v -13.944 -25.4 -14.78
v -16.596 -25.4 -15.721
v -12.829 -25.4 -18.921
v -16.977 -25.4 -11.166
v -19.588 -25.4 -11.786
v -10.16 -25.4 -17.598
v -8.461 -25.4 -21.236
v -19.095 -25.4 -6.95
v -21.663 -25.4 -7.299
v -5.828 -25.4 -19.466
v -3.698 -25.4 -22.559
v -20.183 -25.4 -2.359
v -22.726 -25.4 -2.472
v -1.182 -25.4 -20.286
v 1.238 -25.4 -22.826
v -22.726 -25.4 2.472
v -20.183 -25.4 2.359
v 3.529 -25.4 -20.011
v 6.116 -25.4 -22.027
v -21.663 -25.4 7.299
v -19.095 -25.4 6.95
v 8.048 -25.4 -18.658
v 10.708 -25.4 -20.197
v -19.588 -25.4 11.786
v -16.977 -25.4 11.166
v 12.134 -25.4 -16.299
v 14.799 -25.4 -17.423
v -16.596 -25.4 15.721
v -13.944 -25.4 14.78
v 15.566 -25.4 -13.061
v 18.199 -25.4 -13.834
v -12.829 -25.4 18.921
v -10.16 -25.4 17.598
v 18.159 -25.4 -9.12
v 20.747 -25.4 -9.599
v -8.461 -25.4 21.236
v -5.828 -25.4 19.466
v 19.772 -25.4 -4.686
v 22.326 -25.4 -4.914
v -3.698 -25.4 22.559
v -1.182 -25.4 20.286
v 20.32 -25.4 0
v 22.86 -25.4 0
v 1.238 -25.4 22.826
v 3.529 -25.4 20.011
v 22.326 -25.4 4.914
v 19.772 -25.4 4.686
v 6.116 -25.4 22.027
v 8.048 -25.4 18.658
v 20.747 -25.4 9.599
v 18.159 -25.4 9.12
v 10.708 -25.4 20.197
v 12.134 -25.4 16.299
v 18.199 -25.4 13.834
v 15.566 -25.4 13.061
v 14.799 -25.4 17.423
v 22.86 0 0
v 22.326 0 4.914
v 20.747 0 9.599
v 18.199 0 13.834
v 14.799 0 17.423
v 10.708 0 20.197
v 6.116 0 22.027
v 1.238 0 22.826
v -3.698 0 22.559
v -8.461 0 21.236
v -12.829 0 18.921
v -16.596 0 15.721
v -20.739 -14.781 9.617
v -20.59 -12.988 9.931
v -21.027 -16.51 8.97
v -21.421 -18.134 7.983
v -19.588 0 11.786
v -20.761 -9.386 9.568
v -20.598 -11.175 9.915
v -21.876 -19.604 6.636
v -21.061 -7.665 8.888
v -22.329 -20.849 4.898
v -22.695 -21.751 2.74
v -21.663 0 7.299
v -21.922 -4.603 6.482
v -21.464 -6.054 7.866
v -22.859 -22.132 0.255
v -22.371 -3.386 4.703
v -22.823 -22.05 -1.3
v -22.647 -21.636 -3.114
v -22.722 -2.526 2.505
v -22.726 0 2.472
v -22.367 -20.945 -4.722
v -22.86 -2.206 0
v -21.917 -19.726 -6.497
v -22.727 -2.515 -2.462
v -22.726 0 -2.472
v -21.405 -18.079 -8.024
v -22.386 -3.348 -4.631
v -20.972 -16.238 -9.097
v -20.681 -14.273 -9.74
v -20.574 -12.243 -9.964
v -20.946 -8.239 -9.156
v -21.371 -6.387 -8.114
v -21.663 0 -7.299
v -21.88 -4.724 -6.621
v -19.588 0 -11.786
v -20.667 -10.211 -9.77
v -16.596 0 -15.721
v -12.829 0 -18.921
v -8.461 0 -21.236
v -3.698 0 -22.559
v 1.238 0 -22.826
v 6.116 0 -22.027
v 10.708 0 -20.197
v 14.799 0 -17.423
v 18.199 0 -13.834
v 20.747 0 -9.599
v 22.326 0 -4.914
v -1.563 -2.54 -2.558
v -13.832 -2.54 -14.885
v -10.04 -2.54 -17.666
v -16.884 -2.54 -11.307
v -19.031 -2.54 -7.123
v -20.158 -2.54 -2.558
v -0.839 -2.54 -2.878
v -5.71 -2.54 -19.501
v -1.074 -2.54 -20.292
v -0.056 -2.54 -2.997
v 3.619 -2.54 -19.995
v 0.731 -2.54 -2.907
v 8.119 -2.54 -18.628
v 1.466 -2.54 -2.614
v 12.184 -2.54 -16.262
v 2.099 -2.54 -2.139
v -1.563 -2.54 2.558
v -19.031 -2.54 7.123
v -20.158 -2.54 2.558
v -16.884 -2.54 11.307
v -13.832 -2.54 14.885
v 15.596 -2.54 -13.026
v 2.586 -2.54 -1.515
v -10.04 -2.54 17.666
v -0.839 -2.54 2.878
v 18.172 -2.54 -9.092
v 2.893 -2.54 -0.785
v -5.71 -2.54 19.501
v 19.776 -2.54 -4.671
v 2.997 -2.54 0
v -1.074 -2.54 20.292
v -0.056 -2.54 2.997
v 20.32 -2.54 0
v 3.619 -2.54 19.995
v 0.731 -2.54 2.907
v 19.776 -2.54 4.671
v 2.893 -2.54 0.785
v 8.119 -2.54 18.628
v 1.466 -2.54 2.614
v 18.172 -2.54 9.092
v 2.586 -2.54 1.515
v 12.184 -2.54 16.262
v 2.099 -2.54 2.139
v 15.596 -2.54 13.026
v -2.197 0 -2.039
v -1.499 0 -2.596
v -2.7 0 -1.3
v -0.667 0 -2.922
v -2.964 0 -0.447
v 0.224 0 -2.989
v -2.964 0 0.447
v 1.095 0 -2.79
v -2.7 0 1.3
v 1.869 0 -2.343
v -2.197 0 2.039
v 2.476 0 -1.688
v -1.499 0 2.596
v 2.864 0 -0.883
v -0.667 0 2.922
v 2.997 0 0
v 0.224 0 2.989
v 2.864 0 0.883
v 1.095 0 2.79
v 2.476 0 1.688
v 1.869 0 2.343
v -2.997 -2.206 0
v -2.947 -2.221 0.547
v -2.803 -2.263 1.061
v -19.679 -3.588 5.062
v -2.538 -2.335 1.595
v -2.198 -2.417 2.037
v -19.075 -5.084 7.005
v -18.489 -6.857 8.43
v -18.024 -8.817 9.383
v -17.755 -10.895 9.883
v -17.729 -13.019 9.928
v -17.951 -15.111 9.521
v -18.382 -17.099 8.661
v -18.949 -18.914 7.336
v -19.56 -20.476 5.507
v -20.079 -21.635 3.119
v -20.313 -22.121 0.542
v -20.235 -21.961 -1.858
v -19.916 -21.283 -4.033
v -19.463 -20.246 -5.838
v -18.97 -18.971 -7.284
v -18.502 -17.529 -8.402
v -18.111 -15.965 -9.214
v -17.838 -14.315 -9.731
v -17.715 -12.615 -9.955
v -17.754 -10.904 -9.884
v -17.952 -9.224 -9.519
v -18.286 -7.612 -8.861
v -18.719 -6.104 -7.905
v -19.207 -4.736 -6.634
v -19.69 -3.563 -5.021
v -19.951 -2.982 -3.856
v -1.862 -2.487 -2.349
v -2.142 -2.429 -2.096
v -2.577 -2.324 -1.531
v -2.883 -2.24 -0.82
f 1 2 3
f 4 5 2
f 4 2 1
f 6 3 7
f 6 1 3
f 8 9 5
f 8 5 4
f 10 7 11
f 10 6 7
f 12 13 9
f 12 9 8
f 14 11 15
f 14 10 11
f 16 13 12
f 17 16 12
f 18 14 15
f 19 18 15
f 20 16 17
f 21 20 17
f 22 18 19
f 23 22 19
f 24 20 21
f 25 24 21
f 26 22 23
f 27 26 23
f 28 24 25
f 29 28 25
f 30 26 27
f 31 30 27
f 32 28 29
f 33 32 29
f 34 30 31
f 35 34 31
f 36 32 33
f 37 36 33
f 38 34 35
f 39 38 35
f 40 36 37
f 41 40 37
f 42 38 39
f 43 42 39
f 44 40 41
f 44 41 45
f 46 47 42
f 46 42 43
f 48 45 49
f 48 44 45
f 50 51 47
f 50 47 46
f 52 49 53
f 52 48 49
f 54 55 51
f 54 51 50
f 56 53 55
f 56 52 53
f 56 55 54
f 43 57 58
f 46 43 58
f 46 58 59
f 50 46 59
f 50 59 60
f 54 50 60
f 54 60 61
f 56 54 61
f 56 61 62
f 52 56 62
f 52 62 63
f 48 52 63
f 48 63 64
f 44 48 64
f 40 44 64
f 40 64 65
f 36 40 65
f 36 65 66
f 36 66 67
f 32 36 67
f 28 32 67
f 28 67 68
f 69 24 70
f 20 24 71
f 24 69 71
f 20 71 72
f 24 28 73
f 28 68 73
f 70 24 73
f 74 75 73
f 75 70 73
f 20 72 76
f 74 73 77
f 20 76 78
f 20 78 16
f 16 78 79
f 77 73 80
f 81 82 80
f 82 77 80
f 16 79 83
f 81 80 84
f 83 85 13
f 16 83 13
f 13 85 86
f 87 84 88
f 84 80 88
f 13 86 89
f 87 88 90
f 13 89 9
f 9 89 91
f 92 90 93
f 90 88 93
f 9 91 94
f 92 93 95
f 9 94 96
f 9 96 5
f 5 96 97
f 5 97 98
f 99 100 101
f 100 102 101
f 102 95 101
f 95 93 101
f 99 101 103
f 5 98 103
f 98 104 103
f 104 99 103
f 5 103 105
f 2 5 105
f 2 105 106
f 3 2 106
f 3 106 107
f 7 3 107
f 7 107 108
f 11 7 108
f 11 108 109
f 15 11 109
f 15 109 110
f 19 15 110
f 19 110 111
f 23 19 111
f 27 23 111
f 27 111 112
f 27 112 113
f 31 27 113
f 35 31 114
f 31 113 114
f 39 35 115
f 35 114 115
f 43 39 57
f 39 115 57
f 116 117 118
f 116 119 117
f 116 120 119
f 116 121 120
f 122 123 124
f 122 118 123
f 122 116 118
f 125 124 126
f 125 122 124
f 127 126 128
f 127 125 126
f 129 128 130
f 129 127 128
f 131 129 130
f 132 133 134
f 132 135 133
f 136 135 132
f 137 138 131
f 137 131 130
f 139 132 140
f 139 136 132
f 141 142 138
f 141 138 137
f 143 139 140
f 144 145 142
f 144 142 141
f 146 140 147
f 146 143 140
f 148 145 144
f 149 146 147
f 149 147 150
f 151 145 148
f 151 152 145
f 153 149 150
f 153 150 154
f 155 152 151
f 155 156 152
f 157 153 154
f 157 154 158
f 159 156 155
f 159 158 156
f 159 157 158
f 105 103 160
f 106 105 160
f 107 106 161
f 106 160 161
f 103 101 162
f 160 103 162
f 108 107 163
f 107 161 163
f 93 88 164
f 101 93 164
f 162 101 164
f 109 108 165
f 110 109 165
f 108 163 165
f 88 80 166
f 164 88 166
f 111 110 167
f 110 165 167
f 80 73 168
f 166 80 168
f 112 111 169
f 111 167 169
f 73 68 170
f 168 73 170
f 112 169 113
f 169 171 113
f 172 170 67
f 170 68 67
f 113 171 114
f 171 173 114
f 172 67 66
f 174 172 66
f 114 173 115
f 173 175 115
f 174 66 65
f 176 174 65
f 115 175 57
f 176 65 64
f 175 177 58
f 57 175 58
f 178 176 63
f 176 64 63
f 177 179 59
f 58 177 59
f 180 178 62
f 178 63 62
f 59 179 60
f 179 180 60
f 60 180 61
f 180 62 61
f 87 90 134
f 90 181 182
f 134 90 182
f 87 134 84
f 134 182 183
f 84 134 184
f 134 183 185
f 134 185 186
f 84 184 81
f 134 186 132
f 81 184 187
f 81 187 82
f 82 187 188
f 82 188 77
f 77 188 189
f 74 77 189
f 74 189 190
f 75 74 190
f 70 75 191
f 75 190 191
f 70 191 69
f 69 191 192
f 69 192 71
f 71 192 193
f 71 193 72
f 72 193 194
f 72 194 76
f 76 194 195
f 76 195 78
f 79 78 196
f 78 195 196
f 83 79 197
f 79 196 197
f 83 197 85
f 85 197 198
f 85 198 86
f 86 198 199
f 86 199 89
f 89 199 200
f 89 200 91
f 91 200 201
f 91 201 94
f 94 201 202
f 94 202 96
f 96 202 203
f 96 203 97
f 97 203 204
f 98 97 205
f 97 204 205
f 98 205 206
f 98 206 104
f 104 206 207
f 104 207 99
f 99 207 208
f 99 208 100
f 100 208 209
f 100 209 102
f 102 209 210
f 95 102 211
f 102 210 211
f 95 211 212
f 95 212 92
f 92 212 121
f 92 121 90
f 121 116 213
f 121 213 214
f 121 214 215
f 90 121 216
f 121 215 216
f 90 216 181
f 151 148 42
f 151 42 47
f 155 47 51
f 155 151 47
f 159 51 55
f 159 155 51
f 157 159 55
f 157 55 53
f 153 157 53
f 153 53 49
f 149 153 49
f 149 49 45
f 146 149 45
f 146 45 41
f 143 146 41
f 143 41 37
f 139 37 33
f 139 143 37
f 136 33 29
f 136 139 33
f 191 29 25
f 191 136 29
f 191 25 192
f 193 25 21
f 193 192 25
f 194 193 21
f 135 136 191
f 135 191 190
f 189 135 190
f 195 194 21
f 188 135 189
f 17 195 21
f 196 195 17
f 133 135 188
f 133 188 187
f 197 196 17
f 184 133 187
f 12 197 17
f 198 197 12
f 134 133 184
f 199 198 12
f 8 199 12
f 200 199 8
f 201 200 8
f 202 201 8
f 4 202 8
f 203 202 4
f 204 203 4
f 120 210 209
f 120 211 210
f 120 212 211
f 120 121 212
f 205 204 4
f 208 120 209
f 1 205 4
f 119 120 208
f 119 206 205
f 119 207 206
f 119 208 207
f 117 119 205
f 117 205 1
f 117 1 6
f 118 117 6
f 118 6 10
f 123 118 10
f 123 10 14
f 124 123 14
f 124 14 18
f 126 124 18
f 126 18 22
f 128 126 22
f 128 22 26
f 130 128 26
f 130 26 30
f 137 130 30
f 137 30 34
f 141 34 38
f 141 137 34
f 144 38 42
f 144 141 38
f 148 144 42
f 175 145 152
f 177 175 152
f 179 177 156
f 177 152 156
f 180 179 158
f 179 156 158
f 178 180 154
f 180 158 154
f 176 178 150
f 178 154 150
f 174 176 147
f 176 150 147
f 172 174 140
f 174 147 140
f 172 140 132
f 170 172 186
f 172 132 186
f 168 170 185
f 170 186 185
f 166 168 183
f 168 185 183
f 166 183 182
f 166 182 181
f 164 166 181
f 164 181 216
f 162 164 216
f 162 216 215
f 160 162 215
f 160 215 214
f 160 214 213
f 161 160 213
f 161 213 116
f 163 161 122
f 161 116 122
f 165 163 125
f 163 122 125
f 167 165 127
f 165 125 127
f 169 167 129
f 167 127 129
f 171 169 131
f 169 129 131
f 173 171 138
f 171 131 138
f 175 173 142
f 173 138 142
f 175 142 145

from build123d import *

# Parameters (mm, degrees)
F0_R     = 22.86
F1_DEPTH = 25.4
F2_T     = -2.54
F3_R     = 2.9972
F4_DEPTH = 12.7
F5_R     = 9.964645
F6_DEPTH = 22.861


with BuildPart() as f1:
    # F0 (on Front) → F1 (new body)
    with BuildSketch(Plane.XZ):
        Circle(F0_R)
    extrude(amount=F1_DEPTH)

    # F2
    f2_openings = [f1.faces().sort_by_distance(p)[0] for p in [
        (0, -25.4, 0),
    ]]
    offset(amount=F2_T, openings=f2_openings)

    # F3 (on face) → F4 (cut, symmetric)
    with BuildSketch(Plane.XZ.offset(2.54)):
        Circle(F3_R)
    extrude(amount=F4_DEPTH, both=True, mode=Mode.SUBTRACT)

    # F5 (on Right) → F6 (cut, through all)
    with BuildSketch(Plane.YZ):
        with Locations((-12.170834, 0)):
            Circle(F5_R)
    extrude(amount=-F6_DEPTH, mode=Mode.SUBTRACT)


solid = f1.part
